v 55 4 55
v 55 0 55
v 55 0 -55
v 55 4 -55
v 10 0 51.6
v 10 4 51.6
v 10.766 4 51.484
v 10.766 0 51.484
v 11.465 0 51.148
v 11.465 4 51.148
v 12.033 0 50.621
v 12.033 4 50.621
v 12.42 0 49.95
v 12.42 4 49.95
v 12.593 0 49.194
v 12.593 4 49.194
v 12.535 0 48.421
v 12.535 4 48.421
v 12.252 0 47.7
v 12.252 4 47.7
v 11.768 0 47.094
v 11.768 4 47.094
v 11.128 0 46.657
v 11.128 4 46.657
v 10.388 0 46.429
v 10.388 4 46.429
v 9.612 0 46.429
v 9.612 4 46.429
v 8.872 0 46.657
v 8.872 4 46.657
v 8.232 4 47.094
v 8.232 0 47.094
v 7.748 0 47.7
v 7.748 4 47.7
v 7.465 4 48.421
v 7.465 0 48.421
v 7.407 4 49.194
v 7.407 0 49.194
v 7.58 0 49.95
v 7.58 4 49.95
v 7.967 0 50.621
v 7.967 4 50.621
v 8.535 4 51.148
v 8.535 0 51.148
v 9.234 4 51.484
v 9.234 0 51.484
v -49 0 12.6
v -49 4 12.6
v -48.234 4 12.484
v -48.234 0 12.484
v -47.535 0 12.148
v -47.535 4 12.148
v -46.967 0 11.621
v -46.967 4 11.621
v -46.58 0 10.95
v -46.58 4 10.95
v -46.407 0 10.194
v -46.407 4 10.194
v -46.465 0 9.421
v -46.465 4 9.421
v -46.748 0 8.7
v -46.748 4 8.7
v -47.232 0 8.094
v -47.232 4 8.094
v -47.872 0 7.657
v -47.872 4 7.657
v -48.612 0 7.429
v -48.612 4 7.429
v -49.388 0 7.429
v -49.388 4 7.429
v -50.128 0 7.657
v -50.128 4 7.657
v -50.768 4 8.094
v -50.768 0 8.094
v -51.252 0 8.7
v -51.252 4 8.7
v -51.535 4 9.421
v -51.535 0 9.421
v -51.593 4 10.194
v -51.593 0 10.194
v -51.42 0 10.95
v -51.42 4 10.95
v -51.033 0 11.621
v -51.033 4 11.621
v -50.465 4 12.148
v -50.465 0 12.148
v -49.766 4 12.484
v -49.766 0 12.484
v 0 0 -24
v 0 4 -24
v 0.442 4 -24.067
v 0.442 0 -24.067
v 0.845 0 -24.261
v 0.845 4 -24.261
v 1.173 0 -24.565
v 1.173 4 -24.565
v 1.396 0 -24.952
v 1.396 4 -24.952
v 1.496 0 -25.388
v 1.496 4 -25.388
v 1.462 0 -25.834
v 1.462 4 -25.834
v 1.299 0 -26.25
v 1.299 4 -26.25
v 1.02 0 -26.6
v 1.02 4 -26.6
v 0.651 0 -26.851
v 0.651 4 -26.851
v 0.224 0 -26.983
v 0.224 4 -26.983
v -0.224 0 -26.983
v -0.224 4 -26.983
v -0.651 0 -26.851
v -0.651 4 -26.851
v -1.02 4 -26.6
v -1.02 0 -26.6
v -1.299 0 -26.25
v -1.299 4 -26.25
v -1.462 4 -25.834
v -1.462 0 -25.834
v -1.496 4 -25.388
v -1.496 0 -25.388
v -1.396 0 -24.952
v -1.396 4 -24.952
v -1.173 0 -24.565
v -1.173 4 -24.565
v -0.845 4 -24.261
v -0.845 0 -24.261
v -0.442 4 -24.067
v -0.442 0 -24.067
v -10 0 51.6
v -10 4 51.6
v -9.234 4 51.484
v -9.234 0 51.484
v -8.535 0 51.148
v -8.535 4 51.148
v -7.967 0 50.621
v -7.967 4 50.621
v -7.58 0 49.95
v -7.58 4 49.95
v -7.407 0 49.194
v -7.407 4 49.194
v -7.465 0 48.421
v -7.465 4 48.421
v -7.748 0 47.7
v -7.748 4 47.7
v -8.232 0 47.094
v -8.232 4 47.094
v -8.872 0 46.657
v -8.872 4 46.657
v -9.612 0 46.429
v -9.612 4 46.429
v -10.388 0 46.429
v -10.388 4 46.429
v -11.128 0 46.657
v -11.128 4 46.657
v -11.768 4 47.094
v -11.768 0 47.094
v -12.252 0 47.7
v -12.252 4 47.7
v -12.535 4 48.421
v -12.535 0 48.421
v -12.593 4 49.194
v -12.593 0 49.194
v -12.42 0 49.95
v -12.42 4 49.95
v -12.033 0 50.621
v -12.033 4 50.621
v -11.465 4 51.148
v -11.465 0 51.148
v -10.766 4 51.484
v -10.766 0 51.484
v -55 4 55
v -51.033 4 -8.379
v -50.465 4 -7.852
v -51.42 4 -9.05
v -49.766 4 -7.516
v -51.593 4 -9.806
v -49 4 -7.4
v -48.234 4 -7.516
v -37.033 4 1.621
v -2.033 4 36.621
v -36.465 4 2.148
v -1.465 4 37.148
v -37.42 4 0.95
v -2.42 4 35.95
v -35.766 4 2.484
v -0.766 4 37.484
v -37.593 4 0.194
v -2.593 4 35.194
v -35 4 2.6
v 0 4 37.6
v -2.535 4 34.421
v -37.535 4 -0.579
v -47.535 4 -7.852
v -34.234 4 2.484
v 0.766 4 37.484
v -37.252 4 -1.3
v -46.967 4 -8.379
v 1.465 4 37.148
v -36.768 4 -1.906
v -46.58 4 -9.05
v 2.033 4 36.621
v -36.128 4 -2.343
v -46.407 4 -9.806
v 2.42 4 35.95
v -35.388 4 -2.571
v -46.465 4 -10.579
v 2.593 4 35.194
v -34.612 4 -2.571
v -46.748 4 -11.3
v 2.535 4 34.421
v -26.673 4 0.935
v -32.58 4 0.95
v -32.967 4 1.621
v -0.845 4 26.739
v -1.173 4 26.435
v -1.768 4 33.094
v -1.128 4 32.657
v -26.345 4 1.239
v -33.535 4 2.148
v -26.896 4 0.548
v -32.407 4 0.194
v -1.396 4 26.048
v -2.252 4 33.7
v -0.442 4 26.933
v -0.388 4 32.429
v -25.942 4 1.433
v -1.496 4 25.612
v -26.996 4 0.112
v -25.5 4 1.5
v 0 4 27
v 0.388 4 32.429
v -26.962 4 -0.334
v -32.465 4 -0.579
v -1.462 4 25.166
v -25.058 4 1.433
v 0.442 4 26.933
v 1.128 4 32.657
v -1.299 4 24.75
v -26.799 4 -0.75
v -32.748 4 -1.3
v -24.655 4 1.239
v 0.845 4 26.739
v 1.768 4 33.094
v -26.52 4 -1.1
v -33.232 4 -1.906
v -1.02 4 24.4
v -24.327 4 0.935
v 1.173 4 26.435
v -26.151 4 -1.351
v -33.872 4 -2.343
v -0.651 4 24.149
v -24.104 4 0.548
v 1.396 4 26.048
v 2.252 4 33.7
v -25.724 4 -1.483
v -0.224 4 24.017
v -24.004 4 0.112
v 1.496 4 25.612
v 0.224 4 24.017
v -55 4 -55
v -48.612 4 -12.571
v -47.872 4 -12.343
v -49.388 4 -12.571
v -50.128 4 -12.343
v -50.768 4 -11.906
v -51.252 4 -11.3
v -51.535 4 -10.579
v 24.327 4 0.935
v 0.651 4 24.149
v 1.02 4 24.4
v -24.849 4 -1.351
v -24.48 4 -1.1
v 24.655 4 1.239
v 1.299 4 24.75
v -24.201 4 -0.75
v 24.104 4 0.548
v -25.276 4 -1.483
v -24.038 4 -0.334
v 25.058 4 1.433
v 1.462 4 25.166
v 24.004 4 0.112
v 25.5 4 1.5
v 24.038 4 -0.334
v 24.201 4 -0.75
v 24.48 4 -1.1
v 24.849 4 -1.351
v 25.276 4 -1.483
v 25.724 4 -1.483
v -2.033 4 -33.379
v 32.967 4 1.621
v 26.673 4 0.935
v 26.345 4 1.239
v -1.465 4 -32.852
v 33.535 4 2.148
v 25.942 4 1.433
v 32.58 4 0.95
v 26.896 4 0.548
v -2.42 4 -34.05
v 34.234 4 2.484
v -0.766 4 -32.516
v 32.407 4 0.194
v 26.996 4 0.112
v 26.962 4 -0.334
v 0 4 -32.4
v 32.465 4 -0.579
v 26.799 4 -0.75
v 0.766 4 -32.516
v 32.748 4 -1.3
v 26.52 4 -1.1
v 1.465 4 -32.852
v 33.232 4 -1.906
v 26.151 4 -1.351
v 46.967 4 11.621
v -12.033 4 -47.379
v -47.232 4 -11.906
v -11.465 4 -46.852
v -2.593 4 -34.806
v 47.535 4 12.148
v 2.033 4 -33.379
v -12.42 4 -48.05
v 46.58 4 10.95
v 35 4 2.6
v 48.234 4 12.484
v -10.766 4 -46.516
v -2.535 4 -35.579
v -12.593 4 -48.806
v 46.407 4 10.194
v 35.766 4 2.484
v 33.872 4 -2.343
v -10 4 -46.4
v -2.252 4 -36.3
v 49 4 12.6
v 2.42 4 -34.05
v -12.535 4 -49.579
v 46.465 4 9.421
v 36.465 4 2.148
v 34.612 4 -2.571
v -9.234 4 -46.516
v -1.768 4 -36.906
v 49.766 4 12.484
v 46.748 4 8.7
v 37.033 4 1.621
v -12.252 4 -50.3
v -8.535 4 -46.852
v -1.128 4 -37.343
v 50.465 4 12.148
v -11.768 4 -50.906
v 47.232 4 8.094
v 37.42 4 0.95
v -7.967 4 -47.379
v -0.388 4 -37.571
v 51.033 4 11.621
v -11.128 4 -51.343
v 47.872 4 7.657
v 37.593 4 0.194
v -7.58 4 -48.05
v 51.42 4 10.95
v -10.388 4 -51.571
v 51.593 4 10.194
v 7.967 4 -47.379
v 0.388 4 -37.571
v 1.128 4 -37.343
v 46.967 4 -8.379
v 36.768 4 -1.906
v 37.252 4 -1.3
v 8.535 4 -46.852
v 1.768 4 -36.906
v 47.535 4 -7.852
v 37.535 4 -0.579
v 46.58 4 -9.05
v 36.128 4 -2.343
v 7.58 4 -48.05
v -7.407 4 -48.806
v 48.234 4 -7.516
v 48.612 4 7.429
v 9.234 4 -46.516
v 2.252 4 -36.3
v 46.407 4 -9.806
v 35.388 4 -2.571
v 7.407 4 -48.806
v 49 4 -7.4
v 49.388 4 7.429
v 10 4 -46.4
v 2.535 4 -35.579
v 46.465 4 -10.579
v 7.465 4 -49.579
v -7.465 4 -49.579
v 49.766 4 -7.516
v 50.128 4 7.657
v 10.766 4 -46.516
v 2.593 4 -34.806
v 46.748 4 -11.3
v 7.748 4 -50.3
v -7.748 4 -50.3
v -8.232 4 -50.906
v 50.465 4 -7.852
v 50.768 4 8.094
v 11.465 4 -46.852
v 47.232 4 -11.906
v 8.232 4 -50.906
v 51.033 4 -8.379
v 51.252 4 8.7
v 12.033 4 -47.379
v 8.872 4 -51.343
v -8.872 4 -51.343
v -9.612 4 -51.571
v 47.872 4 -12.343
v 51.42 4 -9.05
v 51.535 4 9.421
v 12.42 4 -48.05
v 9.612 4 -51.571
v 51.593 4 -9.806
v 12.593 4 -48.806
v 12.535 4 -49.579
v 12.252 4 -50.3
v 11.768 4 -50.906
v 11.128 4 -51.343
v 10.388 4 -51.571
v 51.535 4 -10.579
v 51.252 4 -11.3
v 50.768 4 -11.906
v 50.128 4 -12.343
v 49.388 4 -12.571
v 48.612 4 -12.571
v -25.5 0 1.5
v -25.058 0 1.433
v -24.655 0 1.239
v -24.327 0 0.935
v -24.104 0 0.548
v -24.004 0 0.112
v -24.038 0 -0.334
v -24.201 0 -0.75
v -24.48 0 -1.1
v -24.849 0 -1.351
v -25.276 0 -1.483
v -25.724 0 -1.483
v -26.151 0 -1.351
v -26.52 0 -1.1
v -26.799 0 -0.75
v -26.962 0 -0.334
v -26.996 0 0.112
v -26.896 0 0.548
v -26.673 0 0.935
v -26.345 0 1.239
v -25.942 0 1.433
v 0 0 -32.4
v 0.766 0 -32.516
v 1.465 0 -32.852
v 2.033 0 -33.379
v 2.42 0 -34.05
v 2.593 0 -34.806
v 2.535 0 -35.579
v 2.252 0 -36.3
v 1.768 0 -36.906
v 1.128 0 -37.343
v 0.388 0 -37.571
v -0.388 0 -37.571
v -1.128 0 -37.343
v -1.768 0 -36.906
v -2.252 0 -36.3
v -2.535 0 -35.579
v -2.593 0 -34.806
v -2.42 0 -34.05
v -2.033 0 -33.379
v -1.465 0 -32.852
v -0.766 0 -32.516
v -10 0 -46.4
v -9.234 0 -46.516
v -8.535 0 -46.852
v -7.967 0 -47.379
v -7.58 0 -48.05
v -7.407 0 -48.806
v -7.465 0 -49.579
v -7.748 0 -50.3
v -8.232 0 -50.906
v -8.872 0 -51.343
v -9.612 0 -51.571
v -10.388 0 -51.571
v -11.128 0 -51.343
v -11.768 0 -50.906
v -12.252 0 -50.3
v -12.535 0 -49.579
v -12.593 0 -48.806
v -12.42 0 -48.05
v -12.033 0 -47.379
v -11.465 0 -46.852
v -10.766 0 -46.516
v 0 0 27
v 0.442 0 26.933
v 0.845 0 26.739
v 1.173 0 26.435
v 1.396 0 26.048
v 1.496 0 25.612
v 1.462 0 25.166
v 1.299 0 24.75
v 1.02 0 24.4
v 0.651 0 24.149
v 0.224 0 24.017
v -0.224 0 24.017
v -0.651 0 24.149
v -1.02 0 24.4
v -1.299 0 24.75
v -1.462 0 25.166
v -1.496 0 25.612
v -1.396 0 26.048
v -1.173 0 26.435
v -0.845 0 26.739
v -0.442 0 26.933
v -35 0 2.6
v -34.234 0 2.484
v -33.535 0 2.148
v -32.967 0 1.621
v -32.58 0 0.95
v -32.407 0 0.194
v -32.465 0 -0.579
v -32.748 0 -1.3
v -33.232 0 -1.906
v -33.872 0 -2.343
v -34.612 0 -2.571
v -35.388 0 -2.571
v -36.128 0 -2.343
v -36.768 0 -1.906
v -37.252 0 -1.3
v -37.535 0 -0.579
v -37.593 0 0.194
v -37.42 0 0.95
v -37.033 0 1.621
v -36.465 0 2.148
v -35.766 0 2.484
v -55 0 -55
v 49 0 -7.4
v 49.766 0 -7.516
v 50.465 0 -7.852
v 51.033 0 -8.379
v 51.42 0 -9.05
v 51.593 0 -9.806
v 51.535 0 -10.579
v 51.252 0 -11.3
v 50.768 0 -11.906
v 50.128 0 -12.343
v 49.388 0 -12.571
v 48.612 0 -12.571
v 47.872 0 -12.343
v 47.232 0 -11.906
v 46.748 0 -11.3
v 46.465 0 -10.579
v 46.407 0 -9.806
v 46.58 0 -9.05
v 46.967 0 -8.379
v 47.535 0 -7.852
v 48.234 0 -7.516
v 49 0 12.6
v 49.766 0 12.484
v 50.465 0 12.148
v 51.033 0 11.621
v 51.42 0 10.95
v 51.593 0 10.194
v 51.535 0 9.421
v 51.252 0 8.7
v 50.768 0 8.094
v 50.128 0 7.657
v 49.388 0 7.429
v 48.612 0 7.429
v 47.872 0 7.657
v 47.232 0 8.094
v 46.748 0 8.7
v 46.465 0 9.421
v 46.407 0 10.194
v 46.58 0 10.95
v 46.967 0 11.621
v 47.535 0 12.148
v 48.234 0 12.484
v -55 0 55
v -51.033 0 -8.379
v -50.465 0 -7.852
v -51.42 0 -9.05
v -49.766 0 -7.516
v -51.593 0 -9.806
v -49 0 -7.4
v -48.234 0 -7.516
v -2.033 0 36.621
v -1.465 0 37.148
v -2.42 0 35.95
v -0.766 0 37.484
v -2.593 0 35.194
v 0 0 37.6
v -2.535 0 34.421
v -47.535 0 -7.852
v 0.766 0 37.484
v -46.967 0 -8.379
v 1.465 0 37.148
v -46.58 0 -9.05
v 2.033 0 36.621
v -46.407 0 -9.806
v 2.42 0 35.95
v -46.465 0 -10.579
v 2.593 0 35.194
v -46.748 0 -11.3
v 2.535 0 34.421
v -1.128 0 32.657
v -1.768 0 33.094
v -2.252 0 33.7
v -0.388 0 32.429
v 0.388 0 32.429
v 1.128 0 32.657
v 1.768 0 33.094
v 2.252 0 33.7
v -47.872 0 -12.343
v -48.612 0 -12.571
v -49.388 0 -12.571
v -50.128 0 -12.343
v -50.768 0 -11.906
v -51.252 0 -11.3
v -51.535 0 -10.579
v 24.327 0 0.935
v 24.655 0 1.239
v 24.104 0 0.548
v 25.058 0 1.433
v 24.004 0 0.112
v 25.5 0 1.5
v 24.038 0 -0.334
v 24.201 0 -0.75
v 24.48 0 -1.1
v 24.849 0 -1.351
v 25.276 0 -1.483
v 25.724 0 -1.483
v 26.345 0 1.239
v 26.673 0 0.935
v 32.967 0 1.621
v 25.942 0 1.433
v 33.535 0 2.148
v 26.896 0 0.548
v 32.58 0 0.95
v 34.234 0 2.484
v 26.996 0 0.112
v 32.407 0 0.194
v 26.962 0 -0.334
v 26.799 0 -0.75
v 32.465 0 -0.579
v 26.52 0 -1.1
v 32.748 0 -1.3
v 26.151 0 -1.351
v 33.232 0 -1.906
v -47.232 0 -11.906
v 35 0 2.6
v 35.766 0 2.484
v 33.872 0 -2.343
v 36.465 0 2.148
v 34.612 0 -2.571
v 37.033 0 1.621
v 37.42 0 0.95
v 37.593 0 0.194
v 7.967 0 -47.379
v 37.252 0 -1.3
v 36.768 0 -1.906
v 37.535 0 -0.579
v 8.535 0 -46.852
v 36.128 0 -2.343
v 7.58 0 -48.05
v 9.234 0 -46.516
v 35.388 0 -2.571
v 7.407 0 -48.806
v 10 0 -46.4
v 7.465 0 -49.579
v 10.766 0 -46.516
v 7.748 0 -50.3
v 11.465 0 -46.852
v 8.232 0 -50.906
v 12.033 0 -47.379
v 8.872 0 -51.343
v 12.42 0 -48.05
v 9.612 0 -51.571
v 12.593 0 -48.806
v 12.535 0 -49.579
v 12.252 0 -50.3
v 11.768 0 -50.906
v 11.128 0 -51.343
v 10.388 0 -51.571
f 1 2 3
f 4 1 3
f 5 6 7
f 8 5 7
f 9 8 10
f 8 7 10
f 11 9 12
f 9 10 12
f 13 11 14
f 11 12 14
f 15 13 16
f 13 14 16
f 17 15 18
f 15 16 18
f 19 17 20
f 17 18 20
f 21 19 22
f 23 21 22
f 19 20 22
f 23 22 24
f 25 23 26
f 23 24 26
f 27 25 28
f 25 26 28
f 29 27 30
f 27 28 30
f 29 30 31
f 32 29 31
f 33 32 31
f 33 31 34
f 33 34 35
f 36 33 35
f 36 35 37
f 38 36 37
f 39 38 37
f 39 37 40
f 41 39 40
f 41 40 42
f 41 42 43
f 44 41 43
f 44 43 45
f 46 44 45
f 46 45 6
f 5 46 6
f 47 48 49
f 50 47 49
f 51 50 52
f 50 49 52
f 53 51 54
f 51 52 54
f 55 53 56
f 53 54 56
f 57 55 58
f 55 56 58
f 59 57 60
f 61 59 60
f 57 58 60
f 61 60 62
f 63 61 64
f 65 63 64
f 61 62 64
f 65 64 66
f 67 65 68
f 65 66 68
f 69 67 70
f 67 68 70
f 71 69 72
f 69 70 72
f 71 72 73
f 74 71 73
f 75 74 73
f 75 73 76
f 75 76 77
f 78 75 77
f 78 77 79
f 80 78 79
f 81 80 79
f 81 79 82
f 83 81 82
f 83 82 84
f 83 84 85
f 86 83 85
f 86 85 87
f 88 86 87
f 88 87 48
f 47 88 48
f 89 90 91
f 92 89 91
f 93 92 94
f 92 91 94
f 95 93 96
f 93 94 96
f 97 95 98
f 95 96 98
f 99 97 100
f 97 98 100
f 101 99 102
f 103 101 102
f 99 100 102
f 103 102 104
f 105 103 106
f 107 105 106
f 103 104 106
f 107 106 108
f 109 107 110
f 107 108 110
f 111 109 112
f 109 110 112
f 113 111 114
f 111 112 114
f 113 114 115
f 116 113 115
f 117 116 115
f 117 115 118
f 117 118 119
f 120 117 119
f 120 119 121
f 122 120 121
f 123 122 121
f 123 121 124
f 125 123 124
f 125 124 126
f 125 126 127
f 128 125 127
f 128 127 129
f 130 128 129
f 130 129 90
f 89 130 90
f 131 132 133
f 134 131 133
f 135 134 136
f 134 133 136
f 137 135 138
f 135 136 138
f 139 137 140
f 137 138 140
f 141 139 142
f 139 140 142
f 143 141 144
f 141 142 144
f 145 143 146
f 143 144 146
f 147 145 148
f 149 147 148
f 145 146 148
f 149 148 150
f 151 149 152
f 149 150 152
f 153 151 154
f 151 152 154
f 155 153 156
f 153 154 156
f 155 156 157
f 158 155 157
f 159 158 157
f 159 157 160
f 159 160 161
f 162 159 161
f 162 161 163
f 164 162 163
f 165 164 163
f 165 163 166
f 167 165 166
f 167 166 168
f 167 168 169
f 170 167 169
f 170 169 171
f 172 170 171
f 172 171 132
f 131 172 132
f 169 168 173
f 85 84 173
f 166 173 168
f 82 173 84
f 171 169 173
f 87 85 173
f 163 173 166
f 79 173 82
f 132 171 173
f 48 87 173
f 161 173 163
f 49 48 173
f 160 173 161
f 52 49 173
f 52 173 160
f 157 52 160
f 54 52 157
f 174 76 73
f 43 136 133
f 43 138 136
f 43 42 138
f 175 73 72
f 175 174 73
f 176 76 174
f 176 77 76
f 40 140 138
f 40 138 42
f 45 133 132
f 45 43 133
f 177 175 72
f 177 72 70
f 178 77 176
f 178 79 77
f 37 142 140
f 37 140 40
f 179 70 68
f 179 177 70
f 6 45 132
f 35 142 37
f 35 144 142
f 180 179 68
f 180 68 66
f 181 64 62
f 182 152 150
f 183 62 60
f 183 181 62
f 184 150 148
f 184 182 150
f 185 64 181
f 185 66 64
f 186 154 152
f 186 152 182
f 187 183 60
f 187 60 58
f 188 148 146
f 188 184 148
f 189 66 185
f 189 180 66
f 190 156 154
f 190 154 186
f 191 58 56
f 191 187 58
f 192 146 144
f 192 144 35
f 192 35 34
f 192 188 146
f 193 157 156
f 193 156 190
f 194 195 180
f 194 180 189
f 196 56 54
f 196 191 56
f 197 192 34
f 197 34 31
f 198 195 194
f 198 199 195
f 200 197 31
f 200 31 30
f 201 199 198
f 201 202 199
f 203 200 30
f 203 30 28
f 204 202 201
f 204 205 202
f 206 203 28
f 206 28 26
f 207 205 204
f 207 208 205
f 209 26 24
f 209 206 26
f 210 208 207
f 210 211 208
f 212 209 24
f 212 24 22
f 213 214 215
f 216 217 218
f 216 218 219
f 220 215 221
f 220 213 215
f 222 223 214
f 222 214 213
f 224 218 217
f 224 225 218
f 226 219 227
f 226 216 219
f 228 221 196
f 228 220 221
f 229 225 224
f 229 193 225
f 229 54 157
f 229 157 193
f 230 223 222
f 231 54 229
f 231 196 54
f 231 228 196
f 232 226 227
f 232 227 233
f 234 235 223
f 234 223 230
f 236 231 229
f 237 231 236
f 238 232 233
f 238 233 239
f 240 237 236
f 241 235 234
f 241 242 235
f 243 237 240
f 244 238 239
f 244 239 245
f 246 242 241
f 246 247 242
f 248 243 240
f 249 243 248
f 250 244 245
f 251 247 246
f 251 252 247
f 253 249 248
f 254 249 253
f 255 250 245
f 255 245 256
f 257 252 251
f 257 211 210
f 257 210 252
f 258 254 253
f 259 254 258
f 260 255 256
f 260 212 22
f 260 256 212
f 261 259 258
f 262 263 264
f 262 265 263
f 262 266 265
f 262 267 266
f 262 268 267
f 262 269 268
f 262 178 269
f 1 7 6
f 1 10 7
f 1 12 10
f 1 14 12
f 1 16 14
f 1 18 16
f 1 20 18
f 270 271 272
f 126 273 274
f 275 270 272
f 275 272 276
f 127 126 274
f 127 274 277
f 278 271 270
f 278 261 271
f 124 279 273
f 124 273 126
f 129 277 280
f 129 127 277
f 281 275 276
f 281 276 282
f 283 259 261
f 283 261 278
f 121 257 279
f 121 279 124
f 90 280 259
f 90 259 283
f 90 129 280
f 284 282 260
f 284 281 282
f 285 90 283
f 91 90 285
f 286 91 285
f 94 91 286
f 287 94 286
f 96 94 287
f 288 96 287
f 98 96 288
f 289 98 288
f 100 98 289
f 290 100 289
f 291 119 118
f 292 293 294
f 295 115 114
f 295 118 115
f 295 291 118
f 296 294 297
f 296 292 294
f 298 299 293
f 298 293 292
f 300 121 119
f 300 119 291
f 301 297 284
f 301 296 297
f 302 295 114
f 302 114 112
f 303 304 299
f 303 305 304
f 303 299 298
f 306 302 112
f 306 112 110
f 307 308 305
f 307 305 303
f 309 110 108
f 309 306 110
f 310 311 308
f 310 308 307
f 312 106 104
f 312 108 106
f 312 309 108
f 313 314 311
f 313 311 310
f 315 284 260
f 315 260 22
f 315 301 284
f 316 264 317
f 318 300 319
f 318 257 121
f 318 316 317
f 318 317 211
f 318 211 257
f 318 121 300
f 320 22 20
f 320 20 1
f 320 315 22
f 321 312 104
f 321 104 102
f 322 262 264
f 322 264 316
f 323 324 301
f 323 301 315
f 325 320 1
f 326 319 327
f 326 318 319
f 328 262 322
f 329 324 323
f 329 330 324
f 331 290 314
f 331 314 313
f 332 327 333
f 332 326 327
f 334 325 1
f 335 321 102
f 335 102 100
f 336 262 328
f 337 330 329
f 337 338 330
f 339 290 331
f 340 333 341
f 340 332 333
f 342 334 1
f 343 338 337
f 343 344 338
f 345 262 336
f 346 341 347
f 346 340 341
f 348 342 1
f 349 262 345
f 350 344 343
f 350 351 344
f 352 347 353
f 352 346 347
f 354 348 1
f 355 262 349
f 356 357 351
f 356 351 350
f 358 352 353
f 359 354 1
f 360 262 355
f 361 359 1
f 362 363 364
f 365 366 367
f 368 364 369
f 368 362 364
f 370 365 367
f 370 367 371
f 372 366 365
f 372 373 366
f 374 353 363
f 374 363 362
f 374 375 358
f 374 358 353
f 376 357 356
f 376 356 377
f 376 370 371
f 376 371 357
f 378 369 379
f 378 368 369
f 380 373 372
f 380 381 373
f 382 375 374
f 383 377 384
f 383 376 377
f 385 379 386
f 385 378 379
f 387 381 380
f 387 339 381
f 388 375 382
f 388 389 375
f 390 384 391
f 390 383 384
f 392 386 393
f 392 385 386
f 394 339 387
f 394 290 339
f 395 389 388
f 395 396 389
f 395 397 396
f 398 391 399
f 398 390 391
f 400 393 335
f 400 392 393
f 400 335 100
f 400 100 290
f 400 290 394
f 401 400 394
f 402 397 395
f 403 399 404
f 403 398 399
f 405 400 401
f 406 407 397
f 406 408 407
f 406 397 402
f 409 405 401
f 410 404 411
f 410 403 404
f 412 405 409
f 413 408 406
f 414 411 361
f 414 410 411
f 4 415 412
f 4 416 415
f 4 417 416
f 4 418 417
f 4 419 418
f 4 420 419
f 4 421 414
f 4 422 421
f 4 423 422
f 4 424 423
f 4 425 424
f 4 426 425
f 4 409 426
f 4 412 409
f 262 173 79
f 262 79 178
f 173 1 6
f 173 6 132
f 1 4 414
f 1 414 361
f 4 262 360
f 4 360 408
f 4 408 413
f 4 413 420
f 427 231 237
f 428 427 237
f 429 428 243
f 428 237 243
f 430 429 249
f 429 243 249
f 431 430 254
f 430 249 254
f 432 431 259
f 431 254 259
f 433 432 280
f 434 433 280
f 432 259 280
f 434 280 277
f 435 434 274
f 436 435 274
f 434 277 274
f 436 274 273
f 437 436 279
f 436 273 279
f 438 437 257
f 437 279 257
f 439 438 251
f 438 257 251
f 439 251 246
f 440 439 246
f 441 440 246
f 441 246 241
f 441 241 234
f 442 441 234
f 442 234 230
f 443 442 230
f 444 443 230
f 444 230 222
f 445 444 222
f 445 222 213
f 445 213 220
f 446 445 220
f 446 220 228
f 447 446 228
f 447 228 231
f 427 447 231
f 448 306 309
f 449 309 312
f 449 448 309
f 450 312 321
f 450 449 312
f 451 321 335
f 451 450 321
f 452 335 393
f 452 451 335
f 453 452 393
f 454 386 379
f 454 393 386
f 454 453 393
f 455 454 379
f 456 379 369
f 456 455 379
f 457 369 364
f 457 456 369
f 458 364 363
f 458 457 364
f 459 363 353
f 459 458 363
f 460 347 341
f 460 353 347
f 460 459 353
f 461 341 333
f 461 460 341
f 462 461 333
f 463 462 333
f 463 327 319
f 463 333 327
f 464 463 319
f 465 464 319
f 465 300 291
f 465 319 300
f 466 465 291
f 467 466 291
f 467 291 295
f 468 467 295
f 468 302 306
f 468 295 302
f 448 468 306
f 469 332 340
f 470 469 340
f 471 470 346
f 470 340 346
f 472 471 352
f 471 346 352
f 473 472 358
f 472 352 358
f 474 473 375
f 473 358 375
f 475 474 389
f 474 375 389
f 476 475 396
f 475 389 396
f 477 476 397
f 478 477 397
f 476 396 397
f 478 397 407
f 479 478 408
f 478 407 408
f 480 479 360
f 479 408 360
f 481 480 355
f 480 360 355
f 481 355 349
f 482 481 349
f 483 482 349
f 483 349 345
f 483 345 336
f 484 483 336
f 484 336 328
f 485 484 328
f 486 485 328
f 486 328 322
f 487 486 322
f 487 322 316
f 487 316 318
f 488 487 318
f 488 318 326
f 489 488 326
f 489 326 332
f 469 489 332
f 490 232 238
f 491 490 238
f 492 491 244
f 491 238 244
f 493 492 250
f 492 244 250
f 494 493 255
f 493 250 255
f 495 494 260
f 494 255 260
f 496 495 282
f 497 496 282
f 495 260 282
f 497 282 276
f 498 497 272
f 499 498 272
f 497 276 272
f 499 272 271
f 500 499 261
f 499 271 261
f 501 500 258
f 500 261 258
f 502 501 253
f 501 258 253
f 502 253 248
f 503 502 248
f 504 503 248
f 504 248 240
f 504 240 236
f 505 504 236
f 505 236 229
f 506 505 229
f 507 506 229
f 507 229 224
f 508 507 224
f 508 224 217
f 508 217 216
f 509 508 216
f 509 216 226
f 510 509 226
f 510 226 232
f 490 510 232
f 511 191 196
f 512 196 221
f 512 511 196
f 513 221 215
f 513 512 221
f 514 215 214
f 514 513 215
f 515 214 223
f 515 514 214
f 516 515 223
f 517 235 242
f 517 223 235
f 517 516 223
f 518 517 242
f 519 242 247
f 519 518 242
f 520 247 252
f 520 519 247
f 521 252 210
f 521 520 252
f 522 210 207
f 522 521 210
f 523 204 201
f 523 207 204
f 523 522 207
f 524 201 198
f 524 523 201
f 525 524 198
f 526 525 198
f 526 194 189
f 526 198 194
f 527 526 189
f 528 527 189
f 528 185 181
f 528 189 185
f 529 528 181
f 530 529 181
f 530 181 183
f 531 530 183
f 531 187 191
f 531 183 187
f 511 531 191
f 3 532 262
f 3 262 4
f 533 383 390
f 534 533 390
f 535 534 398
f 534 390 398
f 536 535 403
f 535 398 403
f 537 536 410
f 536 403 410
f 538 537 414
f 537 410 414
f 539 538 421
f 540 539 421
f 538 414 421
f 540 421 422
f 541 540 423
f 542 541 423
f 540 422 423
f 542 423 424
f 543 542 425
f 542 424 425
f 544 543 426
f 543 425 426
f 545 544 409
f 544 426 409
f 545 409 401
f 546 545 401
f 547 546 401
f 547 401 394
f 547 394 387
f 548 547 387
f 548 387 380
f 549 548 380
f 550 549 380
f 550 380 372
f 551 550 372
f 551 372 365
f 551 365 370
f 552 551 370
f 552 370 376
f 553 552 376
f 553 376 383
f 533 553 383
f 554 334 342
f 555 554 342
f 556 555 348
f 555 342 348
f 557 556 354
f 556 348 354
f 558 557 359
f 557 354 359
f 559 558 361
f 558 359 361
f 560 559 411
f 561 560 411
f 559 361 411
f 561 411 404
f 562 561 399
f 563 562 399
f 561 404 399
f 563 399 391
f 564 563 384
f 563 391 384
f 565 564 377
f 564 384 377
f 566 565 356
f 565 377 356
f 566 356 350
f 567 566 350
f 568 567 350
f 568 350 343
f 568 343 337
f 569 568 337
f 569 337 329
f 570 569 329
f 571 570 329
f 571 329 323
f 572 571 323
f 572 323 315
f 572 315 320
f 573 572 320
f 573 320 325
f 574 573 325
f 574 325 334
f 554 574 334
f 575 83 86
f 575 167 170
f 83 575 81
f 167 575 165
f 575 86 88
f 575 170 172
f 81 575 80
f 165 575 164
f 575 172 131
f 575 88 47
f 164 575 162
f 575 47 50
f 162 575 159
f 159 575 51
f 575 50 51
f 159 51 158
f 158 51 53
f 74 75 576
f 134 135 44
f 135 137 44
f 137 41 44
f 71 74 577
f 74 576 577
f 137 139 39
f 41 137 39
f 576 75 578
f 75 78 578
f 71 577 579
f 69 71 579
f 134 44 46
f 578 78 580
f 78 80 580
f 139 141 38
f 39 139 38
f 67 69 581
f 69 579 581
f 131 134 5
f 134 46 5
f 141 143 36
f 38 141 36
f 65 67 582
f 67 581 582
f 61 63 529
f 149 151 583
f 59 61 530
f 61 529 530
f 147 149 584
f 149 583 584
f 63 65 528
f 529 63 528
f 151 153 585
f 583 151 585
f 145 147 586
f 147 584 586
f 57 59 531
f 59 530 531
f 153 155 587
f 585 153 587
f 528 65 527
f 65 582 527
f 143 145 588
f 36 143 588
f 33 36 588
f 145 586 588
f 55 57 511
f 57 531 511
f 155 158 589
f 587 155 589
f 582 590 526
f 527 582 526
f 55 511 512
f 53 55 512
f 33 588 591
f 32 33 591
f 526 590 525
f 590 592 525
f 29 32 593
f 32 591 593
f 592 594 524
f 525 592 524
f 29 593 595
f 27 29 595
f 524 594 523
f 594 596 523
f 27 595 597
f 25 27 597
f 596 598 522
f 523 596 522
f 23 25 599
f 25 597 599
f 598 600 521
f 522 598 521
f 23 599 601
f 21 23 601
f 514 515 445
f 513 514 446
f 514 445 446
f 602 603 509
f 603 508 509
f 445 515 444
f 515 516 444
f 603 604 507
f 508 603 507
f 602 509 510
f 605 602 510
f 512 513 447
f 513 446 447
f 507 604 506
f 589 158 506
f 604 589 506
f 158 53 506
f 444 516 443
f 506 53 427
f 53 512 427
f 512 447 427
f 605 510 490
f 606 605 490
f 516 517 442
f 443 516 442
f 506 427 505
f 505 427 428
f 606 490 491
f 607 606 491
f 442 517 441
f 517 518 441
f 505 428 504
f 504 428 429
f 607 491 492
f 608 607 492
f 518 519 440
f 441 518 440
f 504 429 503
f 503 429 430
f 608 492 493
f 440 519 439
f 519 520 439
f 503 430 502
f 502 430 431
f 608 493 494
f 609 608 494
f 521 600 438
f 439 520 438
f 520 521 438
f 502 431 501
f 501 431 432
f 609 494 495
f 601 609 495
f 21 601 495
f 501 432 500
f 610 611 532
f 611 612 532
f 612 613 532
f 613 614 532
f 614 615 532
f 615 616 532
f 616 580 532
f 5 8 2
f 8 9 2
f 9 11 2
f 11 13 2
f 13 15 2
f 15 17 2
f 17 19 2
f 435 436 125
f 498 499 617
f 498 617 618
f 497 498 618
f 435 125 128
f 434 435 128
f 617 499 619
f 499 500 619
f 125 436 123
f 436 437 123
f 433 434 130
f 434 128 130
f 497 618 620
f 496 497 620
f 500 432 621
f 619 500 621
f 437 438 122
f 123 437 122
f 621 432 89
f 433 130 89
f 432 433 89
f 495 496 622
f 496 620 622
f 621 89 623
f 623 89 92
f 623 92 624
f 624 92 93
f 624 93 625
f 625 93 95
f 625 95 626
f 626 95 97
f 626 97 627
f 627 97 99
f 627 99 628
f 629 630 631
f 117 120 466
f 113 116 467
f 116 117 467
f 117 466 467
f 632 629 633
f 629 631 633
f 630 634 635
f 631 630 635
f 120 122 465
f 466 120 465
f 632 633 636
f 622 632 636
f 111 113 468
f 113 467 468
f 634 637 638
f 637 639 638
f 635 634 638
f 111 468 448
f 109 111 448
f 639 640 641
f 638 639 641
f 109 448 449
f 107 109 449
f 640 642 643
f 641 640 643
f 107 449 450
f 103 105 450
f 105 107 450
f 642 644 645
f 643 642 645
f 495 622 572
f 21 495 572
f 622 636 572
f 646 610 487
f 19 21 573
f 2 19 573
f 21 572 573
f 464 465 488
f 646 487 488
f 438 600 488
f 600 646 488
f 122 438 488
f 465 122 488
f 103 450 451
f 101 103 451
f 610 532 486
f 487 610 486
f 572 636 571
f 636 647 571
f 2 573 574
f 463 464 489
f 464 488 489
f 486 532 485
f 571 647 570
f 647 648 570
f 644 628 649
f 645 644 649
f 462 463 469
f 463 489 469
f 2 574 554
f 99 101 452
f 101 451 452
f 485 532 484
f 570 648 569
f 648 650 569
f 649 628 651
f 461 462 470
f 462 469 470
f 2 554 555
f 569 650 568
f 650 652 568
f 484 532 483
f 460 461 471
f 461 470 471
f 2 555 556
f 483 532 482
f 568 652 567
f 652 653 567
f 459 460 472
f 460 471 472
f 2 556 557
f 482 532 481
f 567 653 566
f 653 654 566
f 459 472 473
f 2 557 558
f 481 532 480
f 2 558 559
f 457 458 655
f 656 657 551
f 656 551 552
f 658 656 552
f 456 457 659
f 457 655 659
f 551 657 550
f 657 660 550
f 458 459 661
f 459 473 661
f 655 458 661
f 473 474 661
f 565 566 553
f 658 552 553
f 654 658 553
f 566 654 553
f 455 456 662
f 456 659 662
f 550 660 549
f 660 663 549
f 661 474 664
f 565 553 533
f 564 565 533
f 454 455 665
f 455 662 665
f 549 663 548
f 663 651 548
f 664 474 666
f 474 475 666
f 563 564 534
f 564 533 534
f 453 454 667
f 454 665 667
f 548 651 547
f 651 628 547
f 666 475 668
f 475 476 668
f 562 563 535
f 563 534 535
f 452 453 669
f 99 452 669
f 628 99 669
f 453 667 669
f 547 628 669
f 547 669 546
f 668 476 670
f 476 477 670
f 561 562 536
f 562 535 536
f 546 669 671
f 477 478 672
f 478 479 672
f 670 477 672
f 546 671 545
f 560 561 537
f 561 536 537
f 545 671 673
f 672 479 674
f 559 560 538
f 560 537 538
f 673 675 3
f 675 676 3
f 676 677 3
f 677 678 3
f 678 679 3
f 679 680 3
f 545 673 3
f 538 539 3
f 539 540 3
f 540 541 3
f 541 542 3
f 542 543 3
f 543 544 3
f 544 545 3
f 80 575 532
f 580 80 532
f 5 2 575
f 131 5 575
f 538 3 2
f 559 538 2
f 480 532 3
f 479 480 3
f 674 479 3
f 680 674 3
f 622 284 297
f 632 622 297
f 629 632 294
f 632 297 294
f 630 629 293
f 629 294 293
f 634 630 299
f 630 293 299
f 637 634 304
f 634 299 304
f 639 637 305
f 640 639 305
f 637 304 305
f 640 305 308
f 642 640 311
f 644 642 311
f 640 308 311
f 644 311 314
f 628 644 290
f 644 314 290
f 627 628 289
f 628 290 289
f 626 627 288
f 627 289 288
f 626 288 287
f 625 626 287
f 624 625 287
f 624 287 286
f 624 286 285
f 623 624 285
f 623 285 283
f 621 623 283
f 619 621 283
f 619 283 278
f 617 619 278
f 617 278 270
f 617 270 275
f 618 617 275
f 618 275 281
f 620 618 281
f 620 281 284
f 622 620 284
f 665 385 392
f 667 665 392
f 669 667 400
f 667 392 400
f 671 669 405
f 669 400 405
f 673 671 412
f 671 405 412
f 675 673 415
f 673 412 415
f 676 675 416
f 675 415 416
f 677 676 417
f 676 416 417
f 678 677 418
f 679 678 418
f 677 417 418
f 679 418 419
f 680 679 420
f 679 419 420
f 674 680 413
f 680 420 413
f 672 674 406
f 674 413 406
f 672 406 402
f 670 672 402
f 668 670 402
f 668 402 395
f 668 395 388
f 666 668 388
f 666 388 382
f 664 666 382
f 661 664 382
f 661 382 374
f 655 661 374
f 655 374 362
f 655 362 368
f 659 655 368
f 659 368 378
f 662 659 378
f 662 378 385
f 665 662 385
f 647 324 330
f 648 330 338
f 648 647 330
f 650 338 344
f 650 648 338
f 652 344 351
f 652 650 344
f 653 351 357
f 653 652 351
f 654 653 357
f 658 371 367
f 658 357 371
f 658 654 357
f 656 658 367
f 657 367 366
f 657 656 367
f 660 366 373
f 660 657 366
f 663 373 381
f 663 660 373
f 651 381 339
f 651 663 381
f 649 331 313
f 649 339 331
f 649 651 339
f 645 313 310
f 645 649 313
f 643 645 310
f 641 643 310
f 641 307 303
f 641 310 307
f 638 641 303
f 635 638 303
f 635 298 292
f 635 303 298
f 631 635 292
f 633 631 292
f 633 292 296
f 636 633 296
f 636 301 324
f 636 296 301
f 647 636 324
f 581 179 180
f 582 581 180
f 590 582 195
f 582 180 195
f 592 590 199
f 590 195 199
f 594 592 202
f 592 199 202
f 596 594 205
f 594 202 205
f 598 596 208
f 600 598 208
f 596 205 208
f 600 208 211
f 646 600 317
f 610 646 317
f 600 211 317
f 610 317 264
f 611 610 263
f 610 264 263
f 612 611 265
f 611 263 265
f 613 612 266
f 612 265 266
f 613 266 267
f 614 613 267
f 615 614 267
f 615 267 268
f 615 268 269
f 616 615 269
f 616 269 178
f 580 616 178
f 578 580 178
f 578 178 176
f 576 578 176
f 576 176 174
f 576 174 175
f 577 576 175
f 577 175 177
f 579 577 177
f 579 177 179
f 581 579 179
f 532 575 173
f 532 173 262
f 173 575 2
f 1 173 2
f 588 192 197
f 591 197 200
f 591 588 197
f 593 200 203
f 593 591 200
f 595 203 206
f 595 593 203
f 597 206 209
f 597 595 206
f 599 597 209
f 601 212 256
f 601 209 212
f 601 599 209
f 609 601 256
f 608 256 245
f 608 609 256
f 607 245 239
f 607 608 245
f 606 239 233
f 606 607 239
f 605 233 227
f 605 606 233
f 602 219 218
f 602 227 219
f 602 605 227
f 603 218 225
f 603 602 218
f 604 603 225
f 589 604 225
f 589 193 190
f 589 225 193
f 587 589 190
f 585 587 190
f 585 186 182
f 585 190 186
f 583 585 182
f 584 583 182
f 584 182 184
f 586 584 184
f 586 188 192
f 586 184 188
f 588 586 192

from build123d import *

# Parameters (mm, degrees)
SKETCH_1_W          = 110
SKETCH_1_H          = 110
EXTRUDE_1_DEPTH     = 4
SKETCH_2_R          = 2.6
CUT_EXTRUDE_1_DEPTH = 78.884529914
SKETCH_3_R          = 1.5
CUT_EXTRUDE_2_DEPTH = 78.884529914
SKETCH_4_R          = 2.6
CUT_EXTRUDE_3_DEPTH = 78.884529914


with BuildPart() as part:
    # 草图1 → 凸台-拉伸1 (new body)
    with BuildSketch(Plane(origin=(0, 0, 0), x_dir=(1, 0, 0), z_dir=(0, 1, 0))):
        Rectangle(SKETCH_1_W, SKETCH_1_H)
    extrude(amount=EXTRUDE_1_DEPTH)

    # 草图2 → 切除-拉伸1 (cut, through all)
    with BuildSketch(Plane(origin=(0, 0, 0), x_dir=(1, 0, 0), z_dir=(0, 1, 0))):
        with Locations(Location((0, 35, 0), (0, 0, 270))):
            Circle(SKETCH_2_R)
        with Locations(Location((35, 0, 0), (0, 0, 270))):
            Circle(SKETCH_2_R)
        with Locations(Location((0, -35, 0), (0, 0, 270))):
            Circle(SKETCH_2_R)
        with Locations(Location((-35, 0, 0), (0, 0, 270))):
            Circle(SKETCH_2_R)
    extrude(amount=CUT_EXTRUDE_1_DEPTH, mode=Mode.SUBTRACT)

    # 草图3 → 切除-拉伸2 (cut, through all)
    with BuildSketch(Plane(origin=(0, 4, 0), x_dir=(1, 0, 0), z_dir=(0, 1, 0))):
        with Locations(Location((0, 25.5, 0), (0, 0, 270))):
            Circle(SKETCH_3_R)
        with Locations(Location((25.5, 0, 0), (0, 0, 270))):
            Circle(SKETCH_3_R)
        with Locations(Location((0, -25.5, 0), (0, 0, 270))):
            Circle(SKETCH_3_R)
        with Locations(Location((-25.5, 0, 0), (0, 0, 270))):
            Circle(SKETCH_3_R)
    extrude(amount=-CUT_EXTRUDE_2_DEPTH, mode=Mode.SUBTRACT)

    # 草图4 → 切除-拉伸3 (cut, through all)
    with BuildSketch(Plane(origin=(0, 4, 0), x_dir=(1, 0, 0), z_dir=(0, 1, 0))):
        with Locations(Location((-10, 49, 0), (0, 0, 270))):
            Circle(SKETCH_4_R)
        with Locations(Location((10, 49, 0), (0, 0, 270))):
            Circle(SKETCH_4_R)
        with Locations(Location((49, 10, 0), (0, 0, 270))):
            Circle(SKETCH_4_R)
        with Locations(Location((49, -10, 0), (0, 0, 270))):
            Circle(SKETCH_4_R)
        with Locations(Location((10, -49, 0), (0, 0, 270))):
            Circle(SKETCH_4_R)
        with Locations(Location((-10, -49, 0), (0, 0, 270))):
            Circle(SKETCH_4_R)
        with Locations(Location((-49, -10, 0), (0, 0, 270))):
            Circle(SKETCH_4_R)
        with Locations(Location((-49, 10, 0), (0, 0, 270))):
            Circle(SKETCH_4_R)
    extrude(amount=-CUT_EXTRUDE_3_DEPTH, mode=Mode.SUBTRACT)


solid = part.part
